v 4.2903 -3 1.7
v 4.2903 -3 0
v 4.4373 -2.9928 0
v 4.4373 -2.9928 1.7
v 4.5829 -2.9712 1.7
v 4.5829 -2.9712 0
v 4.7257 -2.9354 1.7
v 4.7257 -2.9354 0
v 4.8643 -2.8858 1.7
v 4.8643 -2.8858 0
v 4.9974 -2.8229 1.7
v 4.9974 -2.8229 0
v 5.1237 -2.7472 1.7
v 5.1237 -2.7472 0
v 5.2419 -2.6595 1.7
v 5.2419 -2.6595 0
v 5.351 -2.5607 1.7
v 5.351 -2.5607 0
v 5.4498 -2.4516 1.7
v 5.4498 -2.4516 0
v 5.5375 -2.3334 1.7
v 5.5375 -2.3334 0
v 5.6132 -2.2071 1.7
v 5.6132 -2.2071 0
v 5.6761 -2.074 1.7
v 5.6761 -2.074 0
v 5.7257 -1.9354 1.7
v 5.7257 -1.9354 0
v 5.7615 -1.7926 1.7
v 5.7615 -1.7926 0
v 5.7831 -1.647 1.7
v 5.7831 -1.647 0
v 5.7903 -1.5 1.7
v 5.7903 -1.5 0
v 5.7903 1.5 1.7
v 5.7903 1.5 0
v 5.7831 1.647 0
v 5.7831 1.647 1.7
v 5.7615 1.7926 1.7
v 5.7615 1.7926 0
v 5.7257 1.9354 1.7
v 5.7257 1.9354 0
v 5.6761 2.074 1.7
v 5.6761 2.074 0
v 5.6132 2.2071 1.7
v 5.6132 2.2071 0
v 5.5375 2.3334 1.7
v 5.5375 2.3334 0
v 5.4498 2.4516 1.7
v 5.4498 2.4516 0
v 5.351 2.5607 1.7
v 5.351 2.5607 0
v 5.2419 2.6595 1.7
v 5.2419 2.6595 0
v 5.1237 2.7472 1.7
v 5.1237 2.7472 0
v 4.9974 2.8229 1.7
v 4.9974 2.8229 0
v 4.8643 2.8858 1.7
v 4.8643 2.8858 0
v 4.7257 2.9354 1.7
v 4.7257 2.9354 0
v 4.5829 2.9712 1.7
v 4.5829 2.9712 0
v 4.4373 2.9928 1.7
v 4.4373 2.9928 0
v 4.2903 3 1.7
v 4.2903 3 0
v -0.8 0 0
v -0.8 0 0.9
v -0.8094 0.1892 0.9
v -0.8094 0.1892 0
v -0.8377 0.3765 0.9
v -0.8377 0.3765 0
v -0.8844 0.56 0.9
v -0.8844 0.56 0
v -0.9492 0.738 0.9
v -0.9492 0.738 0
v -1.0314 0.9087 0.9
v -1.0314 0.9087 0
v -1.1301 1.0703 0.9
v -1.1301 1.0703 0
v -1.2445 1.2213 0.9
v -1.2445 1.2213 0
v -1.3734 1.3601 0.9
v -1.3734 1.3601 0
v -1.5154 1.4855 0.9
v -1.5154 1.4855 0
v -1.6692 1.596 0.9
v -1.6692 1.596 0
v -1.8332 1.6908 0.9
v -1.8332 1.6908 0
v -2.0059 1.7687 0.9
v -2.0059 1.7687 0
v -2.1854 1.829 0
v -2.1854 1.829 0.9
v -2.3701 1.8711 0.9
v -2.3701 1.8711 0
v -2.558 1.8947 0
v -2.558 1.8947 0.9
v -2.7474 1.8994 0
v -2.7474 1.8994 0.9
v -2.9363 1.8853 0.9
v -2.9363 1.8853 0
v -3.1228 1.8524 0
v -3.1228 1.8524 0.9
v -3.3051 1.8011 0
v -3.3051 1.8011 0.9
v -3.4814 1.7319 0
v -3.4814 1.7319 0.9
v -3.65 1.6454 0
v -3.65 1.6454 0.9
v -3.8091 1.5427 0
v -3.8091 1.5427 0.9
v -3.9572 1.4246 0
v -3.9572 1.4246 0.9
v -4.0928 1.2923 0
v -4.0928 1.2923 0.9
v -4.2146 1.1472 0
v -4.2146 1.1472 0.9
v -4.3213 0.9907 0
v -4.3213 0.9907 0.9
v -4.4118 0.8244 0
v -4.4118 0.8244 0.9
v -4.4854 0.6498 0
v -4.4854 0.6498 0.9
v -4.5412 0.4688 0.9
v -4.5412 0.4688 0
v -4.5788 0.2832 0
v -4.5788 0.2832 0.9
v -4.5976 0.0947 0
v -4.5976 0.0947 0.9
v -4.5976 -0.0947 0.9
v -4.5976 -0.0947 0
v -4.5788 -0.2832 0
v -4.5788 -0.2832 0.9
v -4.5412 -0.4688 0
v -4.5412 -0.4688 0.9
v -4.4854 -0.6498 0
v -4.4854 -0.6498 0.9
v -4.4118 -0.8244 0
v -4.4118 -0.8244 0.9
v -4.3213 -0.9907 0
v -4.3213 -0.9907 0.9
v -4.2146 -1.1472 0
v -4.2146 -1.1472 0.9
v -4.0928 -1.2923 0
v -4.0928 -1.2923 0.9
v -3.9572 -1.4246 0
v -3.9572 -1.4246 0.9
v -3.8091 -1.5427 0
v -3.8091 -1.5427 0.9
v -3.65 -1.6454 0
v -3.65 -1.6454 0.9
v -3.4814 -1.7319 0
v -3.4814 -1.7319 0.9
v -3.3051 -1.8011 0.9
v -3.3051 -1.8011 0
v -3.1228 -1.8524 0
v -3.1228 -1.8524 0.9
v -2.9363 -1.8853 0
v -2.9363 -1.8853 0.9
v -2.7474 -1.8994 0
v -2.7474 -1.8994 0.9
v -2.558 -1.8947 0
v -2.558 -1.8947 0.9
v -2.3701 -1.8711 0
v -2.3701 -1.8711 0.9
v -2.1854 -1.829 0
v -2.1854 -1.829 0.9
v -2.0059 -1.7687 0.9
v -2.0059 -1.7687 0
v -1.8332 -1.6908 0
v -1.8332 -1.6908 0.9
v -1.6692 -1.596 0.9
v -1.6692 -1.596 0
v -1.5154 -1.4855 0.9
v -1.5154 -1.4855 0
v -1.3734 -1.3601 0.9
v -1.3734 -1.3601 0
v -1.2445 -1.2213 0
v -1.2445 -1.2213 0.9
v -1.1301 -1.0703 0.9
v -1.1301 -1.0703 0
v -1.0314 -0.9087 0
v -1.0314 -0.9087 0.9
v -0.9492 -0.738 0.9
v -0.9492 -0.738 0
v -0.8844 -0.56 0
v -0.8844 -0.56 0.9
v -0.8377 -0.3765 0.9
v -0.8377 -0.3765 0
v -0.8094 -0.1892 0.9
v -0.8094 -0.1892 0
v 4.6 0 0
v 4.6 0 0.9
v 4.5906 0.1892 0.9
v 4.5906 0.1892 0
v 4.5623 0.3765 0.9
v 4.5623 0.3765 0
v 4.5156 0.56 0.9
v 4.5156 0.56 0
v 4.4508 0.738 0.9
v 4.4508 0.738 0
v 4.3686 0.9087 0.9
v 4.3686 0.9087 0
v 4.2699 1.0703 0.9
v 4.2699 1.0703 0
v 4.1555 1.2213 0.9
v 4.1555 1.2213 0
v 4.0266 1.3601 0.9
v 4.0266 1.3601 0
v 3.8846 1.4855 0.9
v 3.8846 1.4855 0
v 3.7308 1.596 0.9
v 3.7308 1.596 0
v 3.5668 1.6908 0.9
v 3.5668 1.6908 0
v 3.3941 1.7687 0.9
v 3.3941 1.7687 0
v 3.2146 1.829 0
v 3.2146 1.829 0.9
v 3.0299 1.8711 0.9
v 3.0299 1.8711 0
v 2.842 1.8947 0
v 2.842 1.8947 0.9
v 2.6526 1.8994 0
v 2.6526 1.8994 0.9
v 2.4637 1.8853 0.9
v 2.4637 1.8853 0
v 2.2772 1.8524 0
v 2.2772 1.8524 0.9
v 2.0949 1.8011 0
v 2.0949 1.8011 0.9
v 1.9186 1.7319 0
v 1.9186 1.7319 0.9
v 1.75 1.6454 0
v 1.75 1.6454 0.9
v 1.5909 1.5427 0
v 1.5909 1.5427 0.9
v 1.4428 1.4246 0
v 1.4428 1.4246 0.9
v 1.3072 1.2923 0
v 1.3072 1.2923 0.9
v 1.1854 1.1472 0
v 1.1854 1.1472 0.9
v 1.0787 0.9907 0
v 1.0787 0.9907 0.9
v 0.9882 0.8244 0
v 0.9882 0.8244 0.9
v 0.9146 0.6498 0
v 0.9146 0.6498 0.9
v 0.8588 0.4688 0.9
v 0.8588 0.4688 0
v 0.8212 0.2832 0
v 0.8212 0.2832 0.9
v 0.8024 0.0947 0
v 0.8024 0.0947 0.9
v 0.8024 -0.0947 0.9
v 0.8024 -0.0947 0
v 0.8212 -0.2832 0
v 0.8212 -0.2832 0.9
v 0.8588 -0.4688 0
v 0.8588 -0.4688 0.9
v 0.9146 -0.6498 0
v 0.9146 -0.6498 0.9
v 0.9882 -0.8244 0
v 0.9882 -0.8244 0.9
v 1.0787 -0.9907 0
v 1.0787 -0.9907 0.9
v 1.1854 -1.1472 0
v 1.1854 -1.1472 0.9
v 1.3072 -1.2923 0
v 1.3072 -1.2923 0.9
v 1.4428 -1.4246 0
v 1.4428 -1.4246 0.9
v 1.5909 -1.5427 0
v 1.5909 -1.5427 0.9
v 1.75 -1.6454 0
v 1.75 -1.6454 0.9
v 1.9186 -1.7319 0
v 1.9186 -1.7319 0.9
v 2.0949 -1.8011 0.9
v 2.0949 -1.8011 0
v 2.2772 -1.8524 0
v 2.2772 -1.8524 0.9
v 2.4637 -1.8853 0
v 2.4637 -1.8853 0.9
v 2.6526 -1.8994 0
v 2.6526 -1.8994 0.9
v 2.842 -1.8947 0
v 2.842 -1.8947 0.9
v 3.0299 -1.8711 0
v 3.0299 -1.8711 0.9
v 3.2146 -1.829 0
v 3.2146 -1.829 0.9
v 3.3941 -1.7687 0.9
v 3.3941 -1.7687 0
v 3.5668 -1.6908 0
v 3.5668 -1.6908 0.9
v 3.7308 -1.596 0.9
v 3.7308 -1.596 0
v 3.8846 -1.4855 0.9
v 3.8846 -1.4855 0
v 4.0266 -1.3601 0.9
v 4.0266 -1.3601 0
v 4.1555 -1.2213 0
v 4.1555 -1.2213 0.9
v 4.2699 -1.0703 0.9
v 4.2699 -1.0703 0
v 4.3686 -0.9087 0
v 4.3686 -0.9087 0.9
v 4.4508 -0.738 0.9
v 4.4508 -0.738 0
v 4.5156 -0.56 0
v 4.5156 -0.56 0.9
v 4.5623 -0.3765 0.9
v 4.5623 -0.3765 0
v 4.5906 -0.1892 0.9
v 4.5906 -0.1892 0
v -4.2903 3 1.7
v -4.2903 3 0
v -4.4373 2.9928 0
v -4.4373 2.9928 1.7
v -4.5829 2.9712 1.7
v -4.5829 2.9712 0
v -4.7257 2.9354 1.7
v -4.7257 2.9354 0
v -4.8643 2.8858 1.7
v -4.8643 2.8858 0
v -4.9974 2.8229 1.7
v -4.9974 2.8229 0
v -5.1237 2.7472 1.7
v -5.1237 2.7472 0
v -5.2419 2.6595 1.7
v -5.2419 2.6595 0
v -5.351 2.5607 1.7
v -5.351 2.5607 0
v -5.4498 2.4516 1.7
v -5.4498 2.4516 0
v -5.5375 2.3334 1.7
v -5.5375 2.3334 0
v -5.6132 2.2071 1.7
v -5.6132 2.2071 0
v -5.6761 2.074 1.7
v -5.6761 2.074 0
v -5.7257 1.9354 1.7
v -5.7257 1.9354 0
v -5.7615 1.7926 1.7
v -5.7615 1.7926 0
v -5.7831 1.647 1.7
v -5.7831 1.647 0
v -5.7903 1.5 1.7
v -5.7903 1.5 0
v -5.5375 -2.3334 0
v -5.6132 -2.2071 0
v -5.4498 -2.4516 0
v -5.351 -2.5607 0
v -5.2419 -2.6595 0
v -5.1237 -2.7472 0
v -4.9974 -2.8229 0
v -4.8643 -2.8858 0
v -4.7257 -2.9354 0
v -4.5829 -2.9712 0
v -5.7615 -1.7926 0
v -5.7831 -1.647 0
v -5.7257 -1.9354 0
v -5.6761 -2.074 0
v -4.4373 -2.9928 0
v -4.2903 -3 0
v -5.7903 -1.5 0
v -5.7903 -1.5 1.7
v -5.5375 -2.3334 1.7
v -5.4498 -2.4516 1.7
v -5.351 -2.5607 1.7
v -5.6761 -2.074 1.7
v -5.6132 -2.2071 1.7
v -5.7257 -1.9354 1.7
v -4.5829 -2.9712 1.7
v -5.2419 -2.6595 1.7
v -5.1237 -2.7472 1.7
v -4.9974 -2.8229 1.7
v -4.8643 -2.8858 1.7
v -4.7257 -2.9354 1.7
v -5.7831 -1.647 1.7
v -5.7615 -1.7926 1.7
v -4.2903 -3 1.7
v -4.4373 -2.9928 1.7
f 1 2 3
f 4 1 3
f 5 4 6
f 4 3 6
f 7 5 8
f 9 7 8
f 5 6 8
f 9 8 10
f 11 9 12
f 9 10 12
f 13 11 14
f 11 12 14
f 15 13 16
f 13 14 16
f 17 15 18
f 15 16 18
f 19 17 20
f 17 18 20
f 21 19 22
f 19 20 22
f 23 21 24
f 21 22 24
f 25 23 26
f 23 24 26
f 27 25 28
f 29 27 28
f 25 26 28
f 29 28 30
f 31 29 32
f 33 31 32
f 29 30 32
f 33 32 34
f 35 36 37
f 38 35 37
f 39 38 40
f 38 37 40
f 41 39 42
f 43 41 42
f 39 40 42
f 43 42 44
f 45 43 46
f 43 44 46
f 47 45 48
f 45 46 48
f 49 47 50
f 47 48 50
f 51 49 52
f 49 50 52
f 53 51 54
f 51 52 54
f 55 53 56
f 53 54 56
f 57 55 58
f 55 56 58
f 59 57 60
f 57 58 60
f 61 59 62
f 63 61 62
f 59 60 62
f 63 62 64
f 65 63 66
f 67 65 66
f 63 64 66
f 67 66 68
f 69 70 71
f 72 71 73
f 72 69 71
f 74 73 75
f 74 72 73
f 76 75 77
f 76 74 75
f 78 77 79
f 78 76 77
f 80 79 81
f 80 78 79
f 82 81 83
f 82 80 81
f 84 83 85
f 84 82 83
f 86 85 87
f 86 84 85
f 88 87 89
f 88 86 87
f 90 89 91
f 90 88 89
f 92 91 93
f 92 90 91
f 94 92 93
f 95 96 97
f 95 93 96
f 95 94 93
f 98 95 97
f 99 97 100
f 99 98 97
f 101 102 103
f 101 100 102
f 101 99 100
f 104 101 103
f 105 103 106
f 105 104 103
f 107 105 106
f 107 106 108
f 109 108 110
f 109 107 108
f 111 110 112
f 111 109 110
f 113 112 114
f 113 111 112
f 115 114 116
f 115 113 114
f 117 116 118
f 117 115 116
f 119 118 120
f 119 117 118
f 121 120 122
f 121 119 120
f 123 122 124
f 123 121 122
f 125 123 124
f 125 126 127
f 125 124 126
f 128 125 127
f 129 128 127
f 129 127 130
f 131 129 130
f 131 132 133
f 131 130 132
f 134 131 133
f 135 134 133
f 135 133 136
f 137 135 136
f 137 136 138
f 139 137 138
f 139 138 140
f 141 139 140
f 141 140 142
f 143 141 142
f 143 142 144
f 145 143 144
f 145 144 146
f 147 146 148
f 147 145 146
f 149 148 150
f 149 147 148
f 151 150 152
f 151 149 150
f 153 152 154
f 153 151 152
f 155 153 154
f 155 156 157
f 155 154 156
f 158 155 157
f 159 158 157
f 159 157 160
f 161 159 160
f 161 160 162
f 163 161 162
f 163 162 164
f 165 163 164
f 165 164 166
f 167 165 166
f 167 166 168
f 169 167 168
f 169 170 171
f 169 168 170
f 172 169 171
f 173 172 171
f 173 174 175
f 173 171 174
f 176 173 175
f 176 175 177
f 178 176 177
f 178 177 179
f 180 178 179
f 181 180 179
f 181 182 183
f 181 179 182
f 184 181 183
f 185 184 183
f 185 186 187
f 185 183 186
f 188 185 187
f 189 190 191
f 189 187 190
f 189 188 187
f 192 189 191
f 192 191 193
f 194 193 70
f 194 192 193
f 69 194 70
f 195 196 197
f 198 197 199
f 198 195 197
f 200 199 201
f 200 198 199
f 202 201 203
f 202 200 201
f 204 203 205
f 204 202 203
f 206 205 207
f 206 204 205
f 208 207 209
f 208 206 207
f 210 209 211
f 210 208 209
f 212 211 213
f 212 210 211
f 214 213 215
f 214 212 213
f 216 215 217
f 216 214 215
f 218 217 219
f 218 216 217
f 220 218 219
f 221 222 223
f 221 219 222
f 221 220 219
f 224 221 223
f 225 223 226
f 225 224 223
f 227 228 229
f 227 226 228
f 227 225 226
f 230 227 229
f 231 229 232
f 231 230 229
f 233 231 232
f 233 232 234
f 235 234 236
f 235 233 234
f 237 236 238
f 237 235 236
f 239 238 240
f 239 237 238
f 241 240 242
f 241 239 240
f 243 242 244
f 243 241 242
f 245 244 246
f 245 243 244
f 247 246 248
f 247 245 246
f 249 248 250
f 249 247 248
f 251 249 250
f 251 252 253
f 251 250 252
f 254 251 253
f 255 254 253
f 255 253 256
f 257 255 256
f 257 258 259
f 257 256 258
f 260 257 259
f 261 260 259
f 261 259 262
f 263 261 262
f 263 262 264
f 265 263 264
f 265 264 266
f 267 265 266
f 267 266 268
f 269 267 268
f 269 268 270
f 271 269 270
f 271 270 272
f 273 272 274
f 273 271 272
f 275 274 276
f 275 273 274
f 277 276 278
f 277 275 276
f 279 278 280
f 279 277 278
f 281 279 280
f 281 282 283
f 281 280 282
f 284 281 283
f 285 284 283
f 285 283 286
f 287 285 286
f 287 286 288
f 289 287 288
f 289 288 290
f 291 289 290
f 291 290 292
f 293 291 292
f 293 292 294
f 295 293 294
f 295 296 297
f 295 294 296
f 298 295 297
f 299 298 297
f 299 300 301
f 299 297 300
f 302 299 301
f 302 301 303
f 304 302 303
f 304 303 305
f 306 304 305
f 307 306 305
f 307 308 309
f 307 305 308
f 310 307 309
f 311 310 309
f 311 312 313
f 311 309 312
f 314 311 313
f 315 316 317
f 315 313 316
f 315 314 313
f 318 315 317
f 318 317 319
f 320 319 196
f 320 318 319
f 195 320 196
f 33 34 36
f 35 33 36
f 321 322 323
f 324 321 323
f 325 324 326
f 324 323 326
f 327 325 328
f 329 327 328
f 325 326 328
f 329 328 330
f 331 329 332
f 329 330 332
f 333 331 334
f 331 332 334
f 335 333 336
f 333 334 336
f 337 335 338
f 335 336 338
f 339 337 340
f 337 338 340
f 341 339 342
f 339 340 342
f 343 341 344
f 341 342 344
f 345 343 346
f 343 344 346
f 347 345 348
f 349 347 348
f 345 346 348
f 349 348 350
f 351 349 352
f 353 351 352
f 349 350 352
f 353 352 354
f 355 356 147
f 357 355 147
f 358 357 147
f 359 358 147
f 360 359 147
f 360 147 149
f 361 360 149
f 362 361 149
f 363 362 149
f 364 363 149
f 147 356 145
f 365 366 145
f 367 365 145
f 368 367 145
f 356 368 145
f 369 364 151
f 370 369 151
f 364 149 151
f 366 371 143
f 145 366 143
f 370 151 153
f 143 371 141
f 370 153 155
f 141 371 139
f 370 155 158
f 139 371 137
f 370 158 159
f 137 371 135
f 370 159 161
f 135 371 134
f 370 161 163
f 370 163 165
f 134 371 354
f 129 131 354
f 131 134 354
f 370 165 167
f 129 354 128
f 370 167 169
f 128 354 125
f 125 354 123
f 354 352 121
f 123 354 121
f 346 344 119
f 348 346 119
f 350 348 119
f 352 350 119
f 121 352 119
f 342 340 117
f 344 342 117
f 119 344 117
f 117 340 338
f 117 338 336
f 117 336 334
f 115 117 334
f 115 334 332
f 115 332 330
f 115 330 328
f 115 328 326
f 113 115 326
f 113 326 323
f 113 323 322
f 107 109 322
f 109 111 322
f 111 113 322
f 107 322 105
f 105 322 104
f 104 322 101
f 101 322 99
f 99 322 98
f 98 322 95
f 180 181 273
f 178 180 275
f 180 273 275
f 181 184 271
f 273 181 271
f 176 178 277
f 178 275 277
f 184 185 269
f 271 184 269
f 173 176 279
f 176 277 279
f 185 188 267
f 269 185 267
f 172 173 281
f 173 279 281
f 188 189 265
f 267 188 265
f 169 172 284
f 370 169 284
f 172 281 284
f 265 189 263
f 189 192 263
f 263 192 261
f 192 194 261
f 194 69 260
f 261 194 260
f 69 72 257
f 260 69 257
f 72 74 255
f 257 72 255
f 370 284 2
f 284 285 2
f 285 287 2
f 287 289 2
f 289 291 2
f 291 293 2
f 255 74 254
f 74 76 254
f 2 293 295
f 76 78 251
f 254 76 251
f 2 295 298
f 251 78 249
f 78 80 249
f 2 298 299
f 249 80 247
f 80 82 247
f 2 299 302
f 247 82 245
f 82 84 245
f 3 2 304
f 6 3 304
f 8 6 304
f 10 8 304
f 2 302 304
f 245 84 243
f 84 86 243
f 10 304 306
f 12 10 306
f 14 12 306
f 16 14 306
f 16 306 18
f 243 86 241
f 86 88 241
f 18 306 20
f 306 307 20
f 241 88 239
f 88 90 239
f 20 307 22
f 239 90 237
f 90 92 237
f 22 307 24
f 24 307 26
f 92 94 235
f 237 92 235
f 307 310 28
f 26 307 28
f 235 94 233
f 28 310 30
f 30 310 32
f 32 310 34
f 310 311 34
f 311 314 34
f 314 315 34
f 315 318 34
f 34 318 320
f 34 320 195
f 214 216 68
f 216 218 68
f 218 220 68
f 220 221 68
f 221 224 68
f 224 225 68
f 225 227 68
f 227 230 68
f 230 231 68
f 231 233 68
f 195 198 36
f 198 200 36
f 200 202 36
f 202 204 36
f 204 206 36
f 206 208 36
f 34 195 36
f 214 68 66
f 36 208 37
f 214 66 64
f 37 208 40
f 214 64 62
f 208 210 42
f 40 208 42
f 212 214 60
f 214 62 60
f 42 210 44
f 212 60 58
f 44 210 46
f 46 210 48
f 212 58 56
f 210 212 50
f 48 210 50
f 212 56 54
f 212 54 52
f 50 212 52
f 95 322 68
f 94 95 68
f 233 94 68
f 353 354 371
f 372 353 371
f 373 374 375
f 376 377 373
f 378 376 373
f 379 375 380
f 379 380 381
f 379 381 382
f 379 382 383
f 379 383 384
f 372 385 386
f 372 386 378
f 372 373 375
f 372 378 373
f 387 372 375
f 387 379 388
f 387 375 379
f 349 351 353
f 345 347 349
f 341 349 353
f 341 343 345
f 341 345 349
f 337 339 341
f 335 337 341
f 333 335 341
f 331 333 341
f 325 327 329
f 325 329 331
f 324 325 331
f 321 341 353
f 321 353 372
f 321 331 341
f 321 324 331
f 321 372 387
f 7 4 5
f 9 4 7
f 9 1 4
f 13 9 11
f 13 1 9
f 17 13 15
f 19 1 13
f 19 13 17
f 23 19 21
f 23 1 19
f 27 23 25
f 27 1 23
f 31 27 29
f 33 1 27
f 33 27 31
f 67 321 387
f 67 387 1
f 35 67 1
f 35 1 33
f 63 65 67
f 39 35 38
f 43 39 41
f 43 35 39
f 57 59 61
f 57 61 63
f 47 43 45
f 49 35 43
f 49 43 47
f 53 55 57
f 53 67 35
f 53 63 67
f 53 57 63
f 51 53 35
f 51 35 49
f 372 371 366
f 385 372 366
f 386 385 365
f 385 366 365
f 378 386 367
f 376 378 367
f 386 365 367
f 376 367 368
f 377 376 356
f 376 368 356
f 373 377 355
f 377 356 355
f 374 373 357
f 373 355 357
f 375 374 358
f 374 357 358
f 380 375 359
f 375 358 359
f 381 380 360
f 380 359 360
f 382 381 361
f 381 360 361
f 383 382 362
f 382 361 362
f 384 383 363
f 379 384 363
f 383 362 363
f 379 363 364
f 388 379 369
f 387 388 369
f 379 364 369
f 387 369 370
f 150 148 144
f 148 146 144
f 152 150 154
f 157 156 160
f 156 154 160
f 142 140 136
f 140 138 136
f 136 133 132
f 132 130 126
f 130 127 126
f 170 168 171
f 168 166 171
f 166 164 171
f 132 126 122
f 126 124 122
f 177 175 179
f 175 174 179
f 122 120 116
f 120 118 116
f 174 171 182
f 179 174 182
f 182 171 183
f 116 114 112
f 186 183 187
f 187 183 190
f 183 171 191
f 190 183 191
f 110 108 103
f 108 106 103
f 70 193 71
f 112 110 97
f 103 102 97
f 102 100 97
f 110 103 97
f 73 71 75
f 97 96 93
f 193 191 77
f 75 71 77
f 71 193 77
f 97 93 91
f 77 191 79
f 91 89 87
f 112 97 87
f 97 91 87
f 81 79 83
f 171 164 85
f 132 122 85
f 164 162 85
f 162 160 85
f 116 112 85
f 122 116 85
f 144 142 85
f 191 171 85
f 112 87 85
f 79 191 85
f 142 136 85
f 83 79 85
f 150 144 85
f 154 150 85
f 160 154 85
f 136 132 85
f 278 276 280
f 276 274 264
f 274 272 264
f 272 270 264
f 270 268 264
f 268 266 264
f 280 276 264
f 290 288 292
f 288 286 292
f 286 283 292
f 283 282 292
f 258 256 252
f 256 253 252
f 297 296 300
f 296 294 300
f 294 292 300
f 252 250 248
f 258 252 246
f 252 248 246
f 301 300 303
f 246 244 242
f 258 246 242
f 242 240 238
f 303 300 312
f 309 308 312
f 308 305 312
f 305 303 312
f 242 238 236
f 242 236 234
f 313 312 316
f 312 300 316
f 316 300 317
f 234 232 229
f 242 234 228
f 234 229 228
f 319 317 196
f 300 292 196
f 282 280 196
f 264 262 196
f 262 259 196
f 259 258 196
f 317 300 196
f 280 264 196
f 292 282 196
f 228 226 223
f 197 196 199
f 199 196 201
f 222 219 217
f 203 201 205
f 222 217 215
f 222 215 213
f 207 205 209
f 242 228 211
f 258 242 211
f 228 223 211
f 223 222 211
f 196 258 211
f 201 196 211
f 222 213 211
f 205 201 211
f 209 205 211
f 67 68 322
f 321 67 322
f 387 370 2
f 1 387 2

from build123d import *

# Parameters (mm, degrees)
F0_R     = 1.9
F1_DEPTH = 1.7
F2_R     = 1.9
F3_DEPTH = 0.8


# Not quite as in the source:
# - a feature names something its author has since deleted; it is built from what else it names


with BuildPart() as f1:
    # F0 (on Top) → F1 (new body)
    with BuildSketch(Plane.XY):
        with BuildLine():
            Line((-0.3902956496, 3), (-4.2902956496, 3))
            ThreePointArc((-4.2902956496, 3), (-5.3509558214, 2.5606601718), (-5.7902956496, 1.5))
            Line((-5.7902956496, 1.5), (-5.7902956496, -1.5))
            ThreePointArc((-5.7902956496, -1.5), (-5.3509558214, -2.5606601718), (-4.2902956496, -3))
            Line((-4.2902956496, -3), (-0.3902956496, -3))
            Line((-0.3902956496, -3), (0.3902956496, -3))
            Line((0.3902956496, -3), (4.2902956496, -3))
            ThreePointArc((4.2902956496, -3), (5.3509558214, -2.5606601718), (5.7902956496, -1.5))
            Line((5.7902956496, -1.5), (5.7902956496, 1.5))
            ThreePointArc((5.7902956496, 1.5), (5.3509558214, 2.5606601718), (4.2902956496, 3))
            Line((4.2902956496, 3), (0.3902956496, 3))
            Line((0.3902956496, 3), (-0.3902956496, 3))
        make_face()
        with Locations((-2.7, 0)):
            Circle(F0_R, mode=Mode.SUBTRACT)
        with Locations((2.7, 0)):
            Circle(F0_R, mode=Mode.SUBTRACT)
    extrude(amount=F1_DEPTH)

    # F2 (on face) → F3 (join)
    with BuildSketch(Plane.XY.offset(1.7)):
        with BuildLine():
            ThreePointArc((-5.7902956496, -1.5), (-5.3509558214, -2.5606601718), (-4.2902956496, -3))
            Line((-4.2902956496, -3), (4.2902956496, -3))
            ThreePointArc((4.2902956496, -3), (5.3509558214, -2.5606601718), (5.7902956496, -1.5))
            Line((5.7902956496, -1.5), (5.7902956496, 1.5))
            ThreePointArc((5.7902956496, 1.5), (5.3509558214, 2.5606601718), (4.2902956496, 3))
            Line((4.2902956496, 3), (-4.2902956496, 3))
            ThreePointArc((-4.2902956496, 3), (-5.3509558214, 2.5606601718), (-5.7902956496, 1.5))
            Line((-5.7902956496, 1.5), (-5.7902956496, -1.5))
        make_face()
        with Locations((-2.7, 0)):
            Circle(F2_R, mode=Mode.SUBTRACT)
        with Locations((2.7, 0)):
            Circle(F2_R, mode=Mode.SUBTRACT)
        with Locations((-2.7, 0)):
            Circle(F2_R)
        with Locations((2.7, 0)):
            Circle(F2_R)
    extrude(amount=-F3_DEPTH)


solid = f1.part
